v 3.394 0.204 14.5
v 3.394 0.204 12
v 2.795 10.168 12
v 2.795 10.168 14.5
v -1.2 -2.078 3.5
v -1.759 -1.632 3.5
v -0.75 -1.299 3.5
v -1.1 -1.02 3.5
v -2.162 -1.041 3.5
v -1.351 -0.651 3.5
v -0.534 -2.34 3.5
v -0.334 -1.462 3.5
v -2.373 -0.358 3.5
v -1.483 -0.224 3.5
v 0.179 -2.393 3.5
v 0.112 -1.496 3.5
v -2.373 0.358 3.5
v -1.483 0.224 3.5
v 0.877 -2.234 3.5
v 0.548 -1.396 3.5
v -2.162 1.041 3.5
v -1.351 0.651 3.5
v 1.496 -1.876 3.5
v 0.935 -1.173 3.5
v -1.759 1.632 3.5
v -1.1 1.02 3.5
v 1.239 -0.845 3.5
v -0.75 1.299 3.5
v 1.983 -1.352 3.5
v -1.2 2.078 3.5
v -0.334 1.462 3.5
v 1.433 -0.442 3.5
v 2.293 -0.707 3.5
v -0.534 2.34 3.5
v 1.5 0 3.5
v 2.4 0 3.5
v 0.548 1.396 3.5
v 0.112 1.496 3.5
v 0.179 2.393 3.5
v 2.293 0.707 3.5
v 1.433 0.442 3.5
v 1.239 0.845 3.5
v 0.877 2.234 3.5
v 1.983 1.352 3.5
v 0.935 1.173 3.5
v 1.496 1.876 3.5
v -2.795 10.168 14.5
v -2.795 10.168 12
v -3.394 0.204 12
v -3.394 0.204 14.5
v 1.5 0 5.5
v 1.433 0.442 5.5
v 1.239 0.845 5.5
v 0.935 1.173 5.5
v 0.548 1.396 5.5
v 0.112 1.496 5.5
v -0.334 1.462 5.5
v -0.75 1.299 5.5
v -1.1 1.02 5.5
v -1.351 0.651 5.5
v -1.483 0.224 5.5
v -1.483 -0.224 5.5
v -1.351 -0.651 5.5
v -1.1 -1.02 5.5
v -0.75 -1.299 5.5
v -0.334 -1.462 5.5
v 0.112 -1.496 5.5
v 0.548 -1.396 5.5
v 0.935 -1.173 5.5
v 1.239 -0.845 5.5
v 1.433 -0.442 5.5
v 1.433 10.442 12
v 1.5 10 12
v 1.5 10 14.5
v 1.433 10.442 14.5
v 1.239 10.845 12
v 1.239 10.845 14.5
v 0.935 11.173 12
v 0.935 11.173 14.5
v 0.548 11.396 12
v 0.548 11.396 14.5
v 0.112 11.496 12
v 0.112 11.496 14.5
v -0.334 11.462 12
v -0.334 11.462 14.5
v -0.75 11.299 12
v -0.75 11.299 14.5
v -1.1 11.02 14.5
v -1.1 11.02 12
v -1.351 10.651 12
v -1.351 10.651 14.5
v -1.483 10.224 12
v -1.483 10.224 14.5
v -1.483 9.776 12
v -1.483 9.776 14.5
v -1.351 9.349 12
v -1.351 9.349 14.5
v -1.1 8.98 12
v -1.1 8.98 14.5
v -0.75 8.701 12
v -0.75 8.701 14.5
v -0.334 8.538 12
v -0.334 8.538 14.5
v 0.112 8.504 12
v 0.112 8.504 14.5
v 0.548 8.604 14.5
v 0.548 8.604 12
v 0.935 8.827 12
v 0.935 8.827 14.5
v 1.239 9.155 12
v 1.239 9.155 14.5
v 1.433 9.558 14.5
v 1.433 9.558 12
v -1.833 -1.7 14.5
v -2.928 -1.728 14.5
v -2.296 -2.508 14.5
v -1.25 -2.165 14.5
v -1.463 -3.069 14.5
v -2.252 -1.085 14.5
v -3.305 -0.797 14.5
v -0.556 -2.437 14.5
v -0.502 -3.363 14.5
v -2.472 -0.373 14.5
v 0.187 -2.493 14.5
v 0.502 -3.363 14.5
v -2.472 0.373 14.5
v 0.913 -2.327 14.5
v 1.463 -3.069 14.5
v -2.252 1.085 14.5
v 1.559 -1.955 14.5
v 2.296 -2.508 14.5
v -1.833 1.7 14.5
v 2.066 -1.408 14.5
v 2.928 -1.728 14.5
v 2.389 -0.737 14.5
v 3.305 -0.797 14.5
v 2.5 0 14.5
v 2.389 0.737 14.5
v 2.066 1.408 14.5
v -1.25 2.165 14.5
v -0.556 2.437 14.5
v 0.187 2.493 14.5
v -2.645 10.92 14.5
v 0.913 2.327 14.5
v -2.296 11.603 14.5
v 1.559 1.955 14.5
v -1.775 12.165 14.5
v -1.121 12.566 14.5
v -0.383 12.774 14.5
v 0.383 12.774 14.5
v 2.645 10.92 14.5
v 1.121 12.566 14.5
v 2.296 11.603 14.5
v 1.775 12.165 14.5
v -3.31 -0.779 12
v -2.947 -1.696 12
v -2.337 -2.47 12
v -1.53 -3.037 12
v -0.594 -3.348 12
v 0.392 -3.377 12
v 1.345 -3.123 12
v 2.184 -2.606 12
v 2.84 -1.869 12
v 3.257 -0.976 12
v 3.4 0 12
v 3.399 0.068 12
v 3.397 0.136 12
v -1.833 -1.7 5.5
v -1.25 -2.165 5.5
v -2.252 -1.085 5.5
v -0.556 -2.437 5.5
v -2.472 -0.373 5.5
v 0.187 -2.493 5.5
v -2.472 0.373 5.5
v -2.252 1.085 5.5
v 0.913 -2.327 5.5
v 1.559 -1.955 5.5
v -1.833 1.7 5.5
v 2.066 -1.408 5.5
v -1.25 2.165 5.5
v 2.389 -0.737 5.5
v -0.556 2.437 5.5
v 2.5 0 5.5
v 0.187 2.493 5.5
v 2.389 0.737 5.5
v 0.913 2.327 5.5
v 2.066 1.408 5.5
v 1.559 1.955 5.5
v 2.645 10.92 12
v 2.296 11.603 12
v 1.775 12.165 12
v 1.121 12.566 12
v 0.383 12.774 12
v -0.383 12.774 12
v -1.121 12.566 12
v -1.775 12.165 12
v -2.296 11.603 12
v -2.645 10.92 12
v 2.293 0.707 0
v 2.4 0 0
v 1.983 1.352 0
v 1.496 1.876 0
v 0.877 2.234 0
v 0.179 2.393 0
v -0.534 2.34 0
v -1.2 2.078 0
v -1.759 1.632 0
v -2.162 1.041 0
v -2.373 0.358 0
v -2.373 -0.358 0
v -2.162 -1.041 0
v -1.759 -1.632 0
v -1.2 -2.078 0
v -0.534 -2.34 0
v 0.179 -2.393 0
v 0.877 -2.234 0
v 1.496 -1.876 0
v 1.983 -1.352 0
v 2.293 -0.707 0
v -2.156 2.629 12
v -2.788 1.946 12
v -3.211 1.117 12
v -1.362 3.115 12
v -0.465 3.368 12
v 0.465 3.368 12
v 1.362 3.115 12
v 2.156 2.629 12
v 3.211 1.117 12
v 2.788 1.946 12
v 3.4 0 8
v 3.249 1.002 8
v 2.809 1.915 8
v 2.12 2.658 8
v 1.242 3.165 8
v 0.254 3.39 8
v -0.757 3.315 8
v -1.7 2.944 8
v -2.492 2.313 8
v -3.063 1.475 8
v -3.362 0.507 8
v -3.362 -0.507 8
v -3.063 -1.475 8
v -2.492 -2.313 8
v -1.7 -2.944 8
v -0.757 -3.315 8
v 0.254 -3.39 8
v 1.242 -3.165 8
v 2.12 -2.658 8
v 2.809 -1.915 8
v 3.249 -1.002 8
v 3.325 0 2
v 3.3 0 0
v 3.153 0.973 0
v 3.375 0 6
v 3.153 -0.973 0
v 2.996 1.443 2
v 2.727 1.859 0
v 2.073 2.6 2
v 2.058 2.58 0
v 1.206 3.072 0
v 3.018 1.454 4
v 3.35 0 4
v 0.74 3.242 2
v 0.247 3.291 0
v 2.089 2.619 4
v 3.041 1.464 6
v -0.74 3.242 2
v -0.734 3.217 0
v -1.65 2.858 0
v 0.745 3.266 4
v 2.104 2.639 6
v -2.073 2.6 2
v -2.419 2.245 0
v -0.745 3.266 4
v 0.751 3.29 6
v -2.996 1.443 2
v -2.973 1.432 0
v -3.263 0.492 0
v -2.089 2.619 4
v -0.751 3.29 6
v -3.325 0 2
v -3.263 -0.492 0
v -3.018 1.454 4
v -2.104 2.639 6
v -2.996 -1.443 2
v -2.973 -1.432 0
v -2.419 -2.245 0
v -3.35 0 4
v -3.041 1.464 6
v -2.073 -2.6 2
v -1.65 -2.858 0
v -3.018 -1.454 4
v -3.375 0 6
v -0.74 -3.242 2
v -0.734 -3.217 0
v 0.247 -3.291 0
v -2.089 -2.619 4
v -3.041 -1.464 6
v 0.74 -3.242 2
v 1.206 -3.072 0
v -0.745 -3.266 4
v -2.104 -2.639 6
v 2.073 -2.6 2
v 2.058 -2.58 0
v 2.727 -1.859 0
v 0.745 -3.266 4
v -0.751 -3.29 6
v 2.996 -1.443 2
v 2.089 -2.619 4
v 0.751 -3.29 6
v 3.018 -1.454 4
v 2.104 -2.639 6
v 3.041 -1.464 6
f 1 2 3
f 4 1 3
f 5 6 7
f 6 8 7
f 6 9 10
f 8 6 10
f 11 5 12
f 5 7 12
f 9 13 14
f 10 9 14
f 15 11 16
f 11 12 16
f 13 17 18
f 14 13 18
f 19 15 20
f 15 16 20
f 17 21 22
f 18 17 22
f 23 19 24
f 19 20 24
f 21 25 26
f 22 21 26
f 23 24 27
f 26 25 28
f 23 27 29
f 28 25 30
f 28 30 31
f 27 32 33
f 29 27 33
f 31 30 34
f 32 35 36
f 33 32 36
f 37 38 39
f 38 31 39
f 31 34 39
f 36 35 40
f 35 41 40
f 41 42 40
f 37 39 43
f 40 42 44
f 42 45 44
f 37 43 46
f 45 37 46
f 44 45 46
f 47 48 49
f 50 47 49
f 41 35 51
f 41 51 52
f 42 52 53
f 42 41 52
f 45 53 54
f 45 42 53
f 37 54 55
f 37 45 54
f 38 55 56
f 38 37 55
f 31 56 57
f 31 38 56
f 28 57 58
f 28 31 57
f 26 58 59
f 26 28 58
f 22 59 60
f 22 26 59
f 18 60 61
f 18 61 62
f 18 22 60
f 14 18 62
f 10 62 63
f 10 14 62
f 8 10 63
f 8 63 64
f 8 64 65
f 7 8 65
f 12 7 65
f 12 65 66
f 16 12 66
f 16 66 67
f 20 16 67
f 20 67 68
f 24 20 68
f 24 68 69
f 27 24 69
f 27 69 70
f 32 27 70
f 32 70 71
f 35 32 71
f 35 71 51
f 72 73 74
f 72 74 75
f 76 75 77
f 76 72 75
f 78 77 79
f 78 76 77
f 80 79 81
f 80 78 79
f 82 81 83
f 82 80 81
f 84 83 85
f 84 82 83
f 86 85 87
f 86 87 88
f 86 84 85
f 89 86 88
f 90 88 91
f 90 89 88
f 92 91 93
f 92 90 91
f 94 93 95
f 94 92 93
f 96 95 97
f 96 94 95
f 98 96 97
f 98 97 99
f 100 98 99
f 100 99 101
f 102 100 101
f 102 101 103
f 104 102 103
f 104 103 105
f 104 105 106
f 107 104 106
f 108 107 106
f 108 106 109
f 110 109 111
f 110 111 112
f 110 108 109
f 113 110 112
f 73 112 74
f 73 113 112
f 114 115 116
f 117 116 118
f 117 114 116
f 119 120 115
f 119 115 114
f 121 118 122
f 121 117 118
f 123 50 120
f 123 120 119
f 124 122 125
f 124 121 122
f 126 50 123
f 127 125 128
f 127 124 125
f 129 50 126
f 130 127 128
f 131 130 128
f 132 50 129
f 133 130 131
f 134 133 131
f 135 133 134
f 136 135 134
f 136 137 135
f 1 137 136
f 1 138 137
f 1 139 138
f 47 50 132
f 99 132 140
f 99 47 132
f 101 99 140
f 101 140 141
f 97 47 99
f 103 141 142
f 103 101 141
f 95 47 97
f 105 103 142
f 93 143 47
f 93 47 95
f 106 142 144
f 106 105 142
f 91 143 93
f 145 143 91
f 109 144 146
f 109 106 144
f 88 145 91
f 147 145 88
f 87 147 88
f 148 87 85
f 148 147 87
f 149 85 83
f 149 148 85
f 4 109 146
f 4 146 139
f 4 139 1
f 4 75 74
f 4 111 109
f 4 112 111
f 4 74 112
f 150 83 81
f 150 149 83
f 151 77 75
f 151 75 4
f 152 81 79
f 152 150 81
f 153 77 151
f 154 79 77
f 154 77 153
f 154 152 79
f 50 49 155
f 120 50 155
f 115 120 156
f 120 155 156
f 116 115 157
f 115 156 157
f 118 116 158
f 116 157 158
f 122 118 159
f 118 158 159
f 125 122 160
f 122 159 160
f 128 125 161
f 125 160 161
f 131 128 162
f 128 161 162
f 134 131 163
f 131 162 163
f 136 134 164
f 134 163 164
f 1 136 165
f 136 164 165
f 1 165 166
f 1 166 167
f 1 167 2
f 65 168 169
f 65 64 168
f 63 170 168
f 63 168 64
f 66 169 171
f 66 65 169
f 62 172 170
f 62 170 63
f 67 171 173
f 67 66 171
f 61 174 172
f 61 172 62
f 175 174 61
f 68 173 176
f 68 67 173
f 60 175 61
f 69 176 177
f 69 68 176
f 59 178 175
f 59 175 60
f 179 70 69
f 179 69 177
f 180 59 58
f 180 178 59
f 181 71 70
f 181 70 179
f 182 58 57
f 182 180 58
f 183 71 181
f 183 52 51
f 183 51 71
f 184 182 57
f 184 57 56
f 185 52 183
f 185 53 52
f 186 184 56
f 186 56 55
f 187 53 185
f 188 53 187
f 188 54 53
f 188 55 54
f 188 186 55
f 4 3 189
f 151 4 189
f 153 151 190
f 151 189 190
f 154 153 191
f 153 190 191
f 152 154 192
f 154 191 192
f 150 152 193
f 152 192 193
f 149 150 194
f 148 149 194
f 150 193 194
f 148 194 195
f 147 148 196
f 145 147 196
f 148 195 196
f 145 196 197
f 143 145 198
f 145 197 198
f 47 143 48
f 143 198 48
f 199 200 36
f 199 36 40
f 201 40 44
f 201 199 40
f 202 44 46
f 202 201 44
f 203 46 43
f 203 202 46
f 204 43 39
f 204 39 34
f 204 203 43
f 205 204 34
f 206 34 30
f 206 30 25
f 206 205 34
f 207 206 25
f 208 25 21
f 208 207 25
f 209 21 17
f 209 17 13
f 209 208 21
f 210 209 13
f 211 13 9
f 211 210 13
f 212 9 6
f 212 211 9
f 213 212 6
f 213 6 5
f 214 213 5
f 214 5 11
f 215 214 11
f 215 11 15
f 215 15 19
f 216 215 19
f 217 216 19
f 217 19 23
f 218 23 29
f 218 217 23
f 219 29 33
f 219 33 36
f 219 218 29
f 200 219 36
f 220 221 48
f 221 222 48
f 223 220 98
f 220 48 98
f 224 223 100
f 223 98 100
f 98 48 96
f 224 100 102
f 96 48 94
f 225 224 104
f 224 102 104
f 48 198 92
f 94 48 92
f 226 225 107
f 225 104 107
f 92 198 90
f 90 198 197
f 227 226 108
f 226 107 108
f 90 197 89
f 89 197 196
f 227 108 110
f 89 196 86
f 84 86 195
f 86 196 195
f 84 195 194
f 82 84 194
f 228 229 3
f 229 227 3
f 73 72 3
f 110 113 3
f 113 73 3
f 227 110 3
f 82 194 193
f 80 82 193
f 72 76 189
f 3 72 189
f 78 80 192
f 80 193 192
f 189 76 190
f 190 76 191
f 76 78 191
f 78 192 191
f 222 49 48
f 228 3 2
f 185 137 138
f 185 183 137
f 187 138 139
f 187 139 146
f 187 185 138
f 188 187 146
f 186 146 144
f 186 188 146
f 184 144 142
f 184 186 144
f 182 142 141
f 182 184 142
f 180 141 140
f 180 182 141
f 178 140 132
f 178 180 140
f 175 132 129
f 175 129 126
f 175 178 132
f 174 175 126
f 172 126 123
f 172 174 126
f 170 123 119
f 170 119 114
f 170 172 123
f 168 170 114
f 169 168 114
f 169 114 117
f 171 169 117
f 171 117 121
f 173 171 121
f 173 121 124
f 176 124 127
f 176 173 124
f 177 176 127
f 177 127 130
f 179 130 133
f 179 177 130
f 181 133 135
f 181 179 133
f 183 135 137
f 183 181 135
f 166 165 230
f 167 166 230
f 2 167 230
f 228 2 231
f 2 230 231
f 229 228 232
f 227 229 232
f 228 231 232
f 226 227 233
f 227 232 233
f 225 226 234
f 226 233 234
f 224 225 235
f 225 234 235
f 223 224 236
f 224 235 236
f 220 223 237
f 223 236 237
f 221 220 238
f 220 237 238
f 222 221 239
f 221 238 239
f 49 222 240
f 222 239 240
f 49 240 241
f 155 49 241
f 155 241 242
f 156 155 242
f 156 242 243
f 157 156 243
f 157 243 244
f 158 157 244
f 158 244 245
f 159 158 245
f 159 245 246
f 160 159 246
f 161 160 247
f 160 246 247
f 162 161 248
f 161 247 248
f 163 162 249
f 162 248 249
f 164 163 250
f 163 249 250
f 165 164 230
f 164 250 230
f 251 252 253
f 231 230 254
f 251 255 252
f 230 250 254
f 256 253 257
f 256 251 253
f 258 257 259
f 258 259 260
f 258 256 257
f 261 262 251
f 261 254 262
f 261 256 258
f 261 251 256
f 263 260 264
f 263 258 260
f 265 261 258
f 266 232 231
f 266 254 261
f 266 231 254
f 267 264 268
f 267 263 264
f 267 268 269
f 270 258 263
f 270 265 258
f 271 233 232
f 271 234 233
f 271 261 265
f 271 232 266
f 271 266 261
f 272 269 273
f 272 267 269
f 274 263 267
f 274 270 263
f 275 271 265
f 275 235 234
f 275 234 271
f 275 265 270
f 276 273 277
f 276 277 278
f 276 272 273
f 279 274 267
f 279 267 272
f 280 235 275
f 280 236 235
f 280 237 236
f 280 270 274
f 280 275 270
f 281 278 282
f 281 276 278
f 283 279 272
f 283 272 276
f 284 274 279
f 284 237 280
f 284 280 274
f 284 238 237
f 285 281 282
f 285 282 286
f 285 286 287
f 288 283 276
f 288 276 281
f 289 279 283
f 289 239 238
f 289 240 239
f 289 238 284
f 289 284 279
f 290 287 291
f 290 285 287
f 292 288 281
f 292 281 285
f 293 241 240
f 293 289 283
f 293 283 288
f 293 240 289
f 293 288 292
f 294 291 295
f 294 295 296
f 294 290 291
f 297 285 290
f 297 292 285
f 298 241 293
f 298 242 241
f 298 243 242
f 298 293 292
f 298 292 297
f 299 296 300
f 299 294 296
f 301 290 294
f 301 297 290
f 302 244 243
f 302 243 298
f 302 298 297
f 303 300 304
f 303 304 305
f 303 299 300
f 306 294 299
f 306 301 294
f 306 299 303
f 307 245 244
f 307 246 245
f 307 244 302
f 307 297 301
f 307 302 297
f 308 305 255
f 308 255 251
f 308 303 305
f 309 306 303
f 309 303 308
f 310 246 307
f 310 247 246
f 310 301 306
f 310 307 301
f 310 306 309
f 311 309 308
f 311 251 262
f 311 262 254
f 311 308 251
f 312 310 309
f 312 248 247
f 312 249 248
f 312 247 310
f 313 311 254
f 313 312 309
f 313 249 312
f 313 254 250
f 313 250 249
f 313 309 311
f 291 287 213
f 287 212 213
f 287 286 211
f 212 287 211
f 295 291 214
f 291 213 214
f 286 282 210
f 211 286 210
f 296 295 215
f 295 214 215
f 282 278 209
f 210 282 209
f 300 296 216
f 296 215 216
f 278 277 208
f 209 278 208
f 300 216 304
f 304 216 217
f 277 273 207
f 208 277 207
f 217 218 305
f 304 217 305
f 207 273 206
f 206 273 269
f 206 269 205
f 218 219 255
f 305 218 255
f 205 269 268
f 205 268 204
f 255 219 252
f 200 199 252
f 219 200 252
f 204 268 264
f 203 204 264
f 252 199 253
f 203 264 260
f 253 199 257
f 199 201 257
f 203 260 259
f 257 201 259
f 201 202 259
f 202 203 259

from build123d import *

# Parameters (mm, degrees)
SKETCH1_R           = 3.4
SKETCH1_R_2         = 2.4
BOSS_EXTRUDE1_DEPTH = 3.5
SKETCH2_R           = 3.4
SKETCH2_R_2         = 1.5
BOSS_EXTRUDE2_DEPTH = 8.5
CUT_EXTRUDE1_START  = -6.5
SKETCH3_R           = 2.5
SKETCH3_R_2         = 1.5
CUT_EXTRUDE1_DEPTH  = 6.5
SKETCH4_R           = 1.5
SKETCH4_R_2         = 2.5
BOSS_EXTRUDE3_DEPTH = 2.5
CHAMFER_1_SIZE      = 0.1
CHAMFER_1_SIZE2     = 8


with BuildPart() as part:
    # Sketch1 → Boss-Extrude1 (new body)
    with BuildSketch(Plane.XY):
        Circle(SKETCH1_R)
        Circle(SKETCH1_R_2, mode=Mode.SUBTRACT)
    extrude(amount=BOSS_EXTRUDE1_DEPTH)

    # Sketch2 → Boss-Extrude2 (add)
    with BuildSketch(Plane.XY.offset(3.5)):
        Circle(SKETCH2_R)
        Circle(SKETCH2_R_2, mode=Mode.SUBTRACT)
    extrude(amount=BOSS_EXTRUDE2_DEPTH)

    # Sketch3 → Cut-Extrude1 (cut)
    with BuildSketch(Plane.XY.offset(12).offset(CUT_EXTRUDE1_START)):
        Circle(SKETCH3_R)
        Circle(SKETCH3_R_2, mode=Mode.SUBTRACT)
    extrude(amount=CUT_EXTRUDE1_DEPTH, mode=Mode.SUBTRACT)

    # Sketch4 → Boss-Extrude3 (add)
    with BuildSketch(Plane.XY.offset(12)):
        with BuildLine():
            Line((-2.794955456, 10.168), (-3.393874482, 0.204))
            ThreePointArc((-3.393874482, 0.204), (0, -3.4), (3.393874482, 0.204))
            Line((3.393874482, 0.204), (2.794955456, 10.168))
            ThreePointArc((2.794955456, 10.168), (0, 12.8), (-2.794955456, 10.168))
        make_face()
        with Locations((0, 10)):
            Circle(SKETCH4_R, mode=Mode.SUBTRACT)
        Circle(SKETCH4_R_2, mode=Mode.SUBTRACT)
    extrude(amount=BOSS_EXTRUDE3_DEPTH)

    # 倒角1
    chamfer_1_edges = [part.edges().sort_by_distance(p)[0] for p in [
        (-3.4, 0, 0),
    ]]
    chamfer_1_side = [part.faces().sort_by_distance(p)[0] for p in [
        (-3.303833478, 0, 0),
    ]]
    chamfer(chamfer_1_edges, length=CHAMFER_1_SIZE, length2=CHAMFER_1_SIZE2, reference=chamfer_1_side[0])


solid = part.part
